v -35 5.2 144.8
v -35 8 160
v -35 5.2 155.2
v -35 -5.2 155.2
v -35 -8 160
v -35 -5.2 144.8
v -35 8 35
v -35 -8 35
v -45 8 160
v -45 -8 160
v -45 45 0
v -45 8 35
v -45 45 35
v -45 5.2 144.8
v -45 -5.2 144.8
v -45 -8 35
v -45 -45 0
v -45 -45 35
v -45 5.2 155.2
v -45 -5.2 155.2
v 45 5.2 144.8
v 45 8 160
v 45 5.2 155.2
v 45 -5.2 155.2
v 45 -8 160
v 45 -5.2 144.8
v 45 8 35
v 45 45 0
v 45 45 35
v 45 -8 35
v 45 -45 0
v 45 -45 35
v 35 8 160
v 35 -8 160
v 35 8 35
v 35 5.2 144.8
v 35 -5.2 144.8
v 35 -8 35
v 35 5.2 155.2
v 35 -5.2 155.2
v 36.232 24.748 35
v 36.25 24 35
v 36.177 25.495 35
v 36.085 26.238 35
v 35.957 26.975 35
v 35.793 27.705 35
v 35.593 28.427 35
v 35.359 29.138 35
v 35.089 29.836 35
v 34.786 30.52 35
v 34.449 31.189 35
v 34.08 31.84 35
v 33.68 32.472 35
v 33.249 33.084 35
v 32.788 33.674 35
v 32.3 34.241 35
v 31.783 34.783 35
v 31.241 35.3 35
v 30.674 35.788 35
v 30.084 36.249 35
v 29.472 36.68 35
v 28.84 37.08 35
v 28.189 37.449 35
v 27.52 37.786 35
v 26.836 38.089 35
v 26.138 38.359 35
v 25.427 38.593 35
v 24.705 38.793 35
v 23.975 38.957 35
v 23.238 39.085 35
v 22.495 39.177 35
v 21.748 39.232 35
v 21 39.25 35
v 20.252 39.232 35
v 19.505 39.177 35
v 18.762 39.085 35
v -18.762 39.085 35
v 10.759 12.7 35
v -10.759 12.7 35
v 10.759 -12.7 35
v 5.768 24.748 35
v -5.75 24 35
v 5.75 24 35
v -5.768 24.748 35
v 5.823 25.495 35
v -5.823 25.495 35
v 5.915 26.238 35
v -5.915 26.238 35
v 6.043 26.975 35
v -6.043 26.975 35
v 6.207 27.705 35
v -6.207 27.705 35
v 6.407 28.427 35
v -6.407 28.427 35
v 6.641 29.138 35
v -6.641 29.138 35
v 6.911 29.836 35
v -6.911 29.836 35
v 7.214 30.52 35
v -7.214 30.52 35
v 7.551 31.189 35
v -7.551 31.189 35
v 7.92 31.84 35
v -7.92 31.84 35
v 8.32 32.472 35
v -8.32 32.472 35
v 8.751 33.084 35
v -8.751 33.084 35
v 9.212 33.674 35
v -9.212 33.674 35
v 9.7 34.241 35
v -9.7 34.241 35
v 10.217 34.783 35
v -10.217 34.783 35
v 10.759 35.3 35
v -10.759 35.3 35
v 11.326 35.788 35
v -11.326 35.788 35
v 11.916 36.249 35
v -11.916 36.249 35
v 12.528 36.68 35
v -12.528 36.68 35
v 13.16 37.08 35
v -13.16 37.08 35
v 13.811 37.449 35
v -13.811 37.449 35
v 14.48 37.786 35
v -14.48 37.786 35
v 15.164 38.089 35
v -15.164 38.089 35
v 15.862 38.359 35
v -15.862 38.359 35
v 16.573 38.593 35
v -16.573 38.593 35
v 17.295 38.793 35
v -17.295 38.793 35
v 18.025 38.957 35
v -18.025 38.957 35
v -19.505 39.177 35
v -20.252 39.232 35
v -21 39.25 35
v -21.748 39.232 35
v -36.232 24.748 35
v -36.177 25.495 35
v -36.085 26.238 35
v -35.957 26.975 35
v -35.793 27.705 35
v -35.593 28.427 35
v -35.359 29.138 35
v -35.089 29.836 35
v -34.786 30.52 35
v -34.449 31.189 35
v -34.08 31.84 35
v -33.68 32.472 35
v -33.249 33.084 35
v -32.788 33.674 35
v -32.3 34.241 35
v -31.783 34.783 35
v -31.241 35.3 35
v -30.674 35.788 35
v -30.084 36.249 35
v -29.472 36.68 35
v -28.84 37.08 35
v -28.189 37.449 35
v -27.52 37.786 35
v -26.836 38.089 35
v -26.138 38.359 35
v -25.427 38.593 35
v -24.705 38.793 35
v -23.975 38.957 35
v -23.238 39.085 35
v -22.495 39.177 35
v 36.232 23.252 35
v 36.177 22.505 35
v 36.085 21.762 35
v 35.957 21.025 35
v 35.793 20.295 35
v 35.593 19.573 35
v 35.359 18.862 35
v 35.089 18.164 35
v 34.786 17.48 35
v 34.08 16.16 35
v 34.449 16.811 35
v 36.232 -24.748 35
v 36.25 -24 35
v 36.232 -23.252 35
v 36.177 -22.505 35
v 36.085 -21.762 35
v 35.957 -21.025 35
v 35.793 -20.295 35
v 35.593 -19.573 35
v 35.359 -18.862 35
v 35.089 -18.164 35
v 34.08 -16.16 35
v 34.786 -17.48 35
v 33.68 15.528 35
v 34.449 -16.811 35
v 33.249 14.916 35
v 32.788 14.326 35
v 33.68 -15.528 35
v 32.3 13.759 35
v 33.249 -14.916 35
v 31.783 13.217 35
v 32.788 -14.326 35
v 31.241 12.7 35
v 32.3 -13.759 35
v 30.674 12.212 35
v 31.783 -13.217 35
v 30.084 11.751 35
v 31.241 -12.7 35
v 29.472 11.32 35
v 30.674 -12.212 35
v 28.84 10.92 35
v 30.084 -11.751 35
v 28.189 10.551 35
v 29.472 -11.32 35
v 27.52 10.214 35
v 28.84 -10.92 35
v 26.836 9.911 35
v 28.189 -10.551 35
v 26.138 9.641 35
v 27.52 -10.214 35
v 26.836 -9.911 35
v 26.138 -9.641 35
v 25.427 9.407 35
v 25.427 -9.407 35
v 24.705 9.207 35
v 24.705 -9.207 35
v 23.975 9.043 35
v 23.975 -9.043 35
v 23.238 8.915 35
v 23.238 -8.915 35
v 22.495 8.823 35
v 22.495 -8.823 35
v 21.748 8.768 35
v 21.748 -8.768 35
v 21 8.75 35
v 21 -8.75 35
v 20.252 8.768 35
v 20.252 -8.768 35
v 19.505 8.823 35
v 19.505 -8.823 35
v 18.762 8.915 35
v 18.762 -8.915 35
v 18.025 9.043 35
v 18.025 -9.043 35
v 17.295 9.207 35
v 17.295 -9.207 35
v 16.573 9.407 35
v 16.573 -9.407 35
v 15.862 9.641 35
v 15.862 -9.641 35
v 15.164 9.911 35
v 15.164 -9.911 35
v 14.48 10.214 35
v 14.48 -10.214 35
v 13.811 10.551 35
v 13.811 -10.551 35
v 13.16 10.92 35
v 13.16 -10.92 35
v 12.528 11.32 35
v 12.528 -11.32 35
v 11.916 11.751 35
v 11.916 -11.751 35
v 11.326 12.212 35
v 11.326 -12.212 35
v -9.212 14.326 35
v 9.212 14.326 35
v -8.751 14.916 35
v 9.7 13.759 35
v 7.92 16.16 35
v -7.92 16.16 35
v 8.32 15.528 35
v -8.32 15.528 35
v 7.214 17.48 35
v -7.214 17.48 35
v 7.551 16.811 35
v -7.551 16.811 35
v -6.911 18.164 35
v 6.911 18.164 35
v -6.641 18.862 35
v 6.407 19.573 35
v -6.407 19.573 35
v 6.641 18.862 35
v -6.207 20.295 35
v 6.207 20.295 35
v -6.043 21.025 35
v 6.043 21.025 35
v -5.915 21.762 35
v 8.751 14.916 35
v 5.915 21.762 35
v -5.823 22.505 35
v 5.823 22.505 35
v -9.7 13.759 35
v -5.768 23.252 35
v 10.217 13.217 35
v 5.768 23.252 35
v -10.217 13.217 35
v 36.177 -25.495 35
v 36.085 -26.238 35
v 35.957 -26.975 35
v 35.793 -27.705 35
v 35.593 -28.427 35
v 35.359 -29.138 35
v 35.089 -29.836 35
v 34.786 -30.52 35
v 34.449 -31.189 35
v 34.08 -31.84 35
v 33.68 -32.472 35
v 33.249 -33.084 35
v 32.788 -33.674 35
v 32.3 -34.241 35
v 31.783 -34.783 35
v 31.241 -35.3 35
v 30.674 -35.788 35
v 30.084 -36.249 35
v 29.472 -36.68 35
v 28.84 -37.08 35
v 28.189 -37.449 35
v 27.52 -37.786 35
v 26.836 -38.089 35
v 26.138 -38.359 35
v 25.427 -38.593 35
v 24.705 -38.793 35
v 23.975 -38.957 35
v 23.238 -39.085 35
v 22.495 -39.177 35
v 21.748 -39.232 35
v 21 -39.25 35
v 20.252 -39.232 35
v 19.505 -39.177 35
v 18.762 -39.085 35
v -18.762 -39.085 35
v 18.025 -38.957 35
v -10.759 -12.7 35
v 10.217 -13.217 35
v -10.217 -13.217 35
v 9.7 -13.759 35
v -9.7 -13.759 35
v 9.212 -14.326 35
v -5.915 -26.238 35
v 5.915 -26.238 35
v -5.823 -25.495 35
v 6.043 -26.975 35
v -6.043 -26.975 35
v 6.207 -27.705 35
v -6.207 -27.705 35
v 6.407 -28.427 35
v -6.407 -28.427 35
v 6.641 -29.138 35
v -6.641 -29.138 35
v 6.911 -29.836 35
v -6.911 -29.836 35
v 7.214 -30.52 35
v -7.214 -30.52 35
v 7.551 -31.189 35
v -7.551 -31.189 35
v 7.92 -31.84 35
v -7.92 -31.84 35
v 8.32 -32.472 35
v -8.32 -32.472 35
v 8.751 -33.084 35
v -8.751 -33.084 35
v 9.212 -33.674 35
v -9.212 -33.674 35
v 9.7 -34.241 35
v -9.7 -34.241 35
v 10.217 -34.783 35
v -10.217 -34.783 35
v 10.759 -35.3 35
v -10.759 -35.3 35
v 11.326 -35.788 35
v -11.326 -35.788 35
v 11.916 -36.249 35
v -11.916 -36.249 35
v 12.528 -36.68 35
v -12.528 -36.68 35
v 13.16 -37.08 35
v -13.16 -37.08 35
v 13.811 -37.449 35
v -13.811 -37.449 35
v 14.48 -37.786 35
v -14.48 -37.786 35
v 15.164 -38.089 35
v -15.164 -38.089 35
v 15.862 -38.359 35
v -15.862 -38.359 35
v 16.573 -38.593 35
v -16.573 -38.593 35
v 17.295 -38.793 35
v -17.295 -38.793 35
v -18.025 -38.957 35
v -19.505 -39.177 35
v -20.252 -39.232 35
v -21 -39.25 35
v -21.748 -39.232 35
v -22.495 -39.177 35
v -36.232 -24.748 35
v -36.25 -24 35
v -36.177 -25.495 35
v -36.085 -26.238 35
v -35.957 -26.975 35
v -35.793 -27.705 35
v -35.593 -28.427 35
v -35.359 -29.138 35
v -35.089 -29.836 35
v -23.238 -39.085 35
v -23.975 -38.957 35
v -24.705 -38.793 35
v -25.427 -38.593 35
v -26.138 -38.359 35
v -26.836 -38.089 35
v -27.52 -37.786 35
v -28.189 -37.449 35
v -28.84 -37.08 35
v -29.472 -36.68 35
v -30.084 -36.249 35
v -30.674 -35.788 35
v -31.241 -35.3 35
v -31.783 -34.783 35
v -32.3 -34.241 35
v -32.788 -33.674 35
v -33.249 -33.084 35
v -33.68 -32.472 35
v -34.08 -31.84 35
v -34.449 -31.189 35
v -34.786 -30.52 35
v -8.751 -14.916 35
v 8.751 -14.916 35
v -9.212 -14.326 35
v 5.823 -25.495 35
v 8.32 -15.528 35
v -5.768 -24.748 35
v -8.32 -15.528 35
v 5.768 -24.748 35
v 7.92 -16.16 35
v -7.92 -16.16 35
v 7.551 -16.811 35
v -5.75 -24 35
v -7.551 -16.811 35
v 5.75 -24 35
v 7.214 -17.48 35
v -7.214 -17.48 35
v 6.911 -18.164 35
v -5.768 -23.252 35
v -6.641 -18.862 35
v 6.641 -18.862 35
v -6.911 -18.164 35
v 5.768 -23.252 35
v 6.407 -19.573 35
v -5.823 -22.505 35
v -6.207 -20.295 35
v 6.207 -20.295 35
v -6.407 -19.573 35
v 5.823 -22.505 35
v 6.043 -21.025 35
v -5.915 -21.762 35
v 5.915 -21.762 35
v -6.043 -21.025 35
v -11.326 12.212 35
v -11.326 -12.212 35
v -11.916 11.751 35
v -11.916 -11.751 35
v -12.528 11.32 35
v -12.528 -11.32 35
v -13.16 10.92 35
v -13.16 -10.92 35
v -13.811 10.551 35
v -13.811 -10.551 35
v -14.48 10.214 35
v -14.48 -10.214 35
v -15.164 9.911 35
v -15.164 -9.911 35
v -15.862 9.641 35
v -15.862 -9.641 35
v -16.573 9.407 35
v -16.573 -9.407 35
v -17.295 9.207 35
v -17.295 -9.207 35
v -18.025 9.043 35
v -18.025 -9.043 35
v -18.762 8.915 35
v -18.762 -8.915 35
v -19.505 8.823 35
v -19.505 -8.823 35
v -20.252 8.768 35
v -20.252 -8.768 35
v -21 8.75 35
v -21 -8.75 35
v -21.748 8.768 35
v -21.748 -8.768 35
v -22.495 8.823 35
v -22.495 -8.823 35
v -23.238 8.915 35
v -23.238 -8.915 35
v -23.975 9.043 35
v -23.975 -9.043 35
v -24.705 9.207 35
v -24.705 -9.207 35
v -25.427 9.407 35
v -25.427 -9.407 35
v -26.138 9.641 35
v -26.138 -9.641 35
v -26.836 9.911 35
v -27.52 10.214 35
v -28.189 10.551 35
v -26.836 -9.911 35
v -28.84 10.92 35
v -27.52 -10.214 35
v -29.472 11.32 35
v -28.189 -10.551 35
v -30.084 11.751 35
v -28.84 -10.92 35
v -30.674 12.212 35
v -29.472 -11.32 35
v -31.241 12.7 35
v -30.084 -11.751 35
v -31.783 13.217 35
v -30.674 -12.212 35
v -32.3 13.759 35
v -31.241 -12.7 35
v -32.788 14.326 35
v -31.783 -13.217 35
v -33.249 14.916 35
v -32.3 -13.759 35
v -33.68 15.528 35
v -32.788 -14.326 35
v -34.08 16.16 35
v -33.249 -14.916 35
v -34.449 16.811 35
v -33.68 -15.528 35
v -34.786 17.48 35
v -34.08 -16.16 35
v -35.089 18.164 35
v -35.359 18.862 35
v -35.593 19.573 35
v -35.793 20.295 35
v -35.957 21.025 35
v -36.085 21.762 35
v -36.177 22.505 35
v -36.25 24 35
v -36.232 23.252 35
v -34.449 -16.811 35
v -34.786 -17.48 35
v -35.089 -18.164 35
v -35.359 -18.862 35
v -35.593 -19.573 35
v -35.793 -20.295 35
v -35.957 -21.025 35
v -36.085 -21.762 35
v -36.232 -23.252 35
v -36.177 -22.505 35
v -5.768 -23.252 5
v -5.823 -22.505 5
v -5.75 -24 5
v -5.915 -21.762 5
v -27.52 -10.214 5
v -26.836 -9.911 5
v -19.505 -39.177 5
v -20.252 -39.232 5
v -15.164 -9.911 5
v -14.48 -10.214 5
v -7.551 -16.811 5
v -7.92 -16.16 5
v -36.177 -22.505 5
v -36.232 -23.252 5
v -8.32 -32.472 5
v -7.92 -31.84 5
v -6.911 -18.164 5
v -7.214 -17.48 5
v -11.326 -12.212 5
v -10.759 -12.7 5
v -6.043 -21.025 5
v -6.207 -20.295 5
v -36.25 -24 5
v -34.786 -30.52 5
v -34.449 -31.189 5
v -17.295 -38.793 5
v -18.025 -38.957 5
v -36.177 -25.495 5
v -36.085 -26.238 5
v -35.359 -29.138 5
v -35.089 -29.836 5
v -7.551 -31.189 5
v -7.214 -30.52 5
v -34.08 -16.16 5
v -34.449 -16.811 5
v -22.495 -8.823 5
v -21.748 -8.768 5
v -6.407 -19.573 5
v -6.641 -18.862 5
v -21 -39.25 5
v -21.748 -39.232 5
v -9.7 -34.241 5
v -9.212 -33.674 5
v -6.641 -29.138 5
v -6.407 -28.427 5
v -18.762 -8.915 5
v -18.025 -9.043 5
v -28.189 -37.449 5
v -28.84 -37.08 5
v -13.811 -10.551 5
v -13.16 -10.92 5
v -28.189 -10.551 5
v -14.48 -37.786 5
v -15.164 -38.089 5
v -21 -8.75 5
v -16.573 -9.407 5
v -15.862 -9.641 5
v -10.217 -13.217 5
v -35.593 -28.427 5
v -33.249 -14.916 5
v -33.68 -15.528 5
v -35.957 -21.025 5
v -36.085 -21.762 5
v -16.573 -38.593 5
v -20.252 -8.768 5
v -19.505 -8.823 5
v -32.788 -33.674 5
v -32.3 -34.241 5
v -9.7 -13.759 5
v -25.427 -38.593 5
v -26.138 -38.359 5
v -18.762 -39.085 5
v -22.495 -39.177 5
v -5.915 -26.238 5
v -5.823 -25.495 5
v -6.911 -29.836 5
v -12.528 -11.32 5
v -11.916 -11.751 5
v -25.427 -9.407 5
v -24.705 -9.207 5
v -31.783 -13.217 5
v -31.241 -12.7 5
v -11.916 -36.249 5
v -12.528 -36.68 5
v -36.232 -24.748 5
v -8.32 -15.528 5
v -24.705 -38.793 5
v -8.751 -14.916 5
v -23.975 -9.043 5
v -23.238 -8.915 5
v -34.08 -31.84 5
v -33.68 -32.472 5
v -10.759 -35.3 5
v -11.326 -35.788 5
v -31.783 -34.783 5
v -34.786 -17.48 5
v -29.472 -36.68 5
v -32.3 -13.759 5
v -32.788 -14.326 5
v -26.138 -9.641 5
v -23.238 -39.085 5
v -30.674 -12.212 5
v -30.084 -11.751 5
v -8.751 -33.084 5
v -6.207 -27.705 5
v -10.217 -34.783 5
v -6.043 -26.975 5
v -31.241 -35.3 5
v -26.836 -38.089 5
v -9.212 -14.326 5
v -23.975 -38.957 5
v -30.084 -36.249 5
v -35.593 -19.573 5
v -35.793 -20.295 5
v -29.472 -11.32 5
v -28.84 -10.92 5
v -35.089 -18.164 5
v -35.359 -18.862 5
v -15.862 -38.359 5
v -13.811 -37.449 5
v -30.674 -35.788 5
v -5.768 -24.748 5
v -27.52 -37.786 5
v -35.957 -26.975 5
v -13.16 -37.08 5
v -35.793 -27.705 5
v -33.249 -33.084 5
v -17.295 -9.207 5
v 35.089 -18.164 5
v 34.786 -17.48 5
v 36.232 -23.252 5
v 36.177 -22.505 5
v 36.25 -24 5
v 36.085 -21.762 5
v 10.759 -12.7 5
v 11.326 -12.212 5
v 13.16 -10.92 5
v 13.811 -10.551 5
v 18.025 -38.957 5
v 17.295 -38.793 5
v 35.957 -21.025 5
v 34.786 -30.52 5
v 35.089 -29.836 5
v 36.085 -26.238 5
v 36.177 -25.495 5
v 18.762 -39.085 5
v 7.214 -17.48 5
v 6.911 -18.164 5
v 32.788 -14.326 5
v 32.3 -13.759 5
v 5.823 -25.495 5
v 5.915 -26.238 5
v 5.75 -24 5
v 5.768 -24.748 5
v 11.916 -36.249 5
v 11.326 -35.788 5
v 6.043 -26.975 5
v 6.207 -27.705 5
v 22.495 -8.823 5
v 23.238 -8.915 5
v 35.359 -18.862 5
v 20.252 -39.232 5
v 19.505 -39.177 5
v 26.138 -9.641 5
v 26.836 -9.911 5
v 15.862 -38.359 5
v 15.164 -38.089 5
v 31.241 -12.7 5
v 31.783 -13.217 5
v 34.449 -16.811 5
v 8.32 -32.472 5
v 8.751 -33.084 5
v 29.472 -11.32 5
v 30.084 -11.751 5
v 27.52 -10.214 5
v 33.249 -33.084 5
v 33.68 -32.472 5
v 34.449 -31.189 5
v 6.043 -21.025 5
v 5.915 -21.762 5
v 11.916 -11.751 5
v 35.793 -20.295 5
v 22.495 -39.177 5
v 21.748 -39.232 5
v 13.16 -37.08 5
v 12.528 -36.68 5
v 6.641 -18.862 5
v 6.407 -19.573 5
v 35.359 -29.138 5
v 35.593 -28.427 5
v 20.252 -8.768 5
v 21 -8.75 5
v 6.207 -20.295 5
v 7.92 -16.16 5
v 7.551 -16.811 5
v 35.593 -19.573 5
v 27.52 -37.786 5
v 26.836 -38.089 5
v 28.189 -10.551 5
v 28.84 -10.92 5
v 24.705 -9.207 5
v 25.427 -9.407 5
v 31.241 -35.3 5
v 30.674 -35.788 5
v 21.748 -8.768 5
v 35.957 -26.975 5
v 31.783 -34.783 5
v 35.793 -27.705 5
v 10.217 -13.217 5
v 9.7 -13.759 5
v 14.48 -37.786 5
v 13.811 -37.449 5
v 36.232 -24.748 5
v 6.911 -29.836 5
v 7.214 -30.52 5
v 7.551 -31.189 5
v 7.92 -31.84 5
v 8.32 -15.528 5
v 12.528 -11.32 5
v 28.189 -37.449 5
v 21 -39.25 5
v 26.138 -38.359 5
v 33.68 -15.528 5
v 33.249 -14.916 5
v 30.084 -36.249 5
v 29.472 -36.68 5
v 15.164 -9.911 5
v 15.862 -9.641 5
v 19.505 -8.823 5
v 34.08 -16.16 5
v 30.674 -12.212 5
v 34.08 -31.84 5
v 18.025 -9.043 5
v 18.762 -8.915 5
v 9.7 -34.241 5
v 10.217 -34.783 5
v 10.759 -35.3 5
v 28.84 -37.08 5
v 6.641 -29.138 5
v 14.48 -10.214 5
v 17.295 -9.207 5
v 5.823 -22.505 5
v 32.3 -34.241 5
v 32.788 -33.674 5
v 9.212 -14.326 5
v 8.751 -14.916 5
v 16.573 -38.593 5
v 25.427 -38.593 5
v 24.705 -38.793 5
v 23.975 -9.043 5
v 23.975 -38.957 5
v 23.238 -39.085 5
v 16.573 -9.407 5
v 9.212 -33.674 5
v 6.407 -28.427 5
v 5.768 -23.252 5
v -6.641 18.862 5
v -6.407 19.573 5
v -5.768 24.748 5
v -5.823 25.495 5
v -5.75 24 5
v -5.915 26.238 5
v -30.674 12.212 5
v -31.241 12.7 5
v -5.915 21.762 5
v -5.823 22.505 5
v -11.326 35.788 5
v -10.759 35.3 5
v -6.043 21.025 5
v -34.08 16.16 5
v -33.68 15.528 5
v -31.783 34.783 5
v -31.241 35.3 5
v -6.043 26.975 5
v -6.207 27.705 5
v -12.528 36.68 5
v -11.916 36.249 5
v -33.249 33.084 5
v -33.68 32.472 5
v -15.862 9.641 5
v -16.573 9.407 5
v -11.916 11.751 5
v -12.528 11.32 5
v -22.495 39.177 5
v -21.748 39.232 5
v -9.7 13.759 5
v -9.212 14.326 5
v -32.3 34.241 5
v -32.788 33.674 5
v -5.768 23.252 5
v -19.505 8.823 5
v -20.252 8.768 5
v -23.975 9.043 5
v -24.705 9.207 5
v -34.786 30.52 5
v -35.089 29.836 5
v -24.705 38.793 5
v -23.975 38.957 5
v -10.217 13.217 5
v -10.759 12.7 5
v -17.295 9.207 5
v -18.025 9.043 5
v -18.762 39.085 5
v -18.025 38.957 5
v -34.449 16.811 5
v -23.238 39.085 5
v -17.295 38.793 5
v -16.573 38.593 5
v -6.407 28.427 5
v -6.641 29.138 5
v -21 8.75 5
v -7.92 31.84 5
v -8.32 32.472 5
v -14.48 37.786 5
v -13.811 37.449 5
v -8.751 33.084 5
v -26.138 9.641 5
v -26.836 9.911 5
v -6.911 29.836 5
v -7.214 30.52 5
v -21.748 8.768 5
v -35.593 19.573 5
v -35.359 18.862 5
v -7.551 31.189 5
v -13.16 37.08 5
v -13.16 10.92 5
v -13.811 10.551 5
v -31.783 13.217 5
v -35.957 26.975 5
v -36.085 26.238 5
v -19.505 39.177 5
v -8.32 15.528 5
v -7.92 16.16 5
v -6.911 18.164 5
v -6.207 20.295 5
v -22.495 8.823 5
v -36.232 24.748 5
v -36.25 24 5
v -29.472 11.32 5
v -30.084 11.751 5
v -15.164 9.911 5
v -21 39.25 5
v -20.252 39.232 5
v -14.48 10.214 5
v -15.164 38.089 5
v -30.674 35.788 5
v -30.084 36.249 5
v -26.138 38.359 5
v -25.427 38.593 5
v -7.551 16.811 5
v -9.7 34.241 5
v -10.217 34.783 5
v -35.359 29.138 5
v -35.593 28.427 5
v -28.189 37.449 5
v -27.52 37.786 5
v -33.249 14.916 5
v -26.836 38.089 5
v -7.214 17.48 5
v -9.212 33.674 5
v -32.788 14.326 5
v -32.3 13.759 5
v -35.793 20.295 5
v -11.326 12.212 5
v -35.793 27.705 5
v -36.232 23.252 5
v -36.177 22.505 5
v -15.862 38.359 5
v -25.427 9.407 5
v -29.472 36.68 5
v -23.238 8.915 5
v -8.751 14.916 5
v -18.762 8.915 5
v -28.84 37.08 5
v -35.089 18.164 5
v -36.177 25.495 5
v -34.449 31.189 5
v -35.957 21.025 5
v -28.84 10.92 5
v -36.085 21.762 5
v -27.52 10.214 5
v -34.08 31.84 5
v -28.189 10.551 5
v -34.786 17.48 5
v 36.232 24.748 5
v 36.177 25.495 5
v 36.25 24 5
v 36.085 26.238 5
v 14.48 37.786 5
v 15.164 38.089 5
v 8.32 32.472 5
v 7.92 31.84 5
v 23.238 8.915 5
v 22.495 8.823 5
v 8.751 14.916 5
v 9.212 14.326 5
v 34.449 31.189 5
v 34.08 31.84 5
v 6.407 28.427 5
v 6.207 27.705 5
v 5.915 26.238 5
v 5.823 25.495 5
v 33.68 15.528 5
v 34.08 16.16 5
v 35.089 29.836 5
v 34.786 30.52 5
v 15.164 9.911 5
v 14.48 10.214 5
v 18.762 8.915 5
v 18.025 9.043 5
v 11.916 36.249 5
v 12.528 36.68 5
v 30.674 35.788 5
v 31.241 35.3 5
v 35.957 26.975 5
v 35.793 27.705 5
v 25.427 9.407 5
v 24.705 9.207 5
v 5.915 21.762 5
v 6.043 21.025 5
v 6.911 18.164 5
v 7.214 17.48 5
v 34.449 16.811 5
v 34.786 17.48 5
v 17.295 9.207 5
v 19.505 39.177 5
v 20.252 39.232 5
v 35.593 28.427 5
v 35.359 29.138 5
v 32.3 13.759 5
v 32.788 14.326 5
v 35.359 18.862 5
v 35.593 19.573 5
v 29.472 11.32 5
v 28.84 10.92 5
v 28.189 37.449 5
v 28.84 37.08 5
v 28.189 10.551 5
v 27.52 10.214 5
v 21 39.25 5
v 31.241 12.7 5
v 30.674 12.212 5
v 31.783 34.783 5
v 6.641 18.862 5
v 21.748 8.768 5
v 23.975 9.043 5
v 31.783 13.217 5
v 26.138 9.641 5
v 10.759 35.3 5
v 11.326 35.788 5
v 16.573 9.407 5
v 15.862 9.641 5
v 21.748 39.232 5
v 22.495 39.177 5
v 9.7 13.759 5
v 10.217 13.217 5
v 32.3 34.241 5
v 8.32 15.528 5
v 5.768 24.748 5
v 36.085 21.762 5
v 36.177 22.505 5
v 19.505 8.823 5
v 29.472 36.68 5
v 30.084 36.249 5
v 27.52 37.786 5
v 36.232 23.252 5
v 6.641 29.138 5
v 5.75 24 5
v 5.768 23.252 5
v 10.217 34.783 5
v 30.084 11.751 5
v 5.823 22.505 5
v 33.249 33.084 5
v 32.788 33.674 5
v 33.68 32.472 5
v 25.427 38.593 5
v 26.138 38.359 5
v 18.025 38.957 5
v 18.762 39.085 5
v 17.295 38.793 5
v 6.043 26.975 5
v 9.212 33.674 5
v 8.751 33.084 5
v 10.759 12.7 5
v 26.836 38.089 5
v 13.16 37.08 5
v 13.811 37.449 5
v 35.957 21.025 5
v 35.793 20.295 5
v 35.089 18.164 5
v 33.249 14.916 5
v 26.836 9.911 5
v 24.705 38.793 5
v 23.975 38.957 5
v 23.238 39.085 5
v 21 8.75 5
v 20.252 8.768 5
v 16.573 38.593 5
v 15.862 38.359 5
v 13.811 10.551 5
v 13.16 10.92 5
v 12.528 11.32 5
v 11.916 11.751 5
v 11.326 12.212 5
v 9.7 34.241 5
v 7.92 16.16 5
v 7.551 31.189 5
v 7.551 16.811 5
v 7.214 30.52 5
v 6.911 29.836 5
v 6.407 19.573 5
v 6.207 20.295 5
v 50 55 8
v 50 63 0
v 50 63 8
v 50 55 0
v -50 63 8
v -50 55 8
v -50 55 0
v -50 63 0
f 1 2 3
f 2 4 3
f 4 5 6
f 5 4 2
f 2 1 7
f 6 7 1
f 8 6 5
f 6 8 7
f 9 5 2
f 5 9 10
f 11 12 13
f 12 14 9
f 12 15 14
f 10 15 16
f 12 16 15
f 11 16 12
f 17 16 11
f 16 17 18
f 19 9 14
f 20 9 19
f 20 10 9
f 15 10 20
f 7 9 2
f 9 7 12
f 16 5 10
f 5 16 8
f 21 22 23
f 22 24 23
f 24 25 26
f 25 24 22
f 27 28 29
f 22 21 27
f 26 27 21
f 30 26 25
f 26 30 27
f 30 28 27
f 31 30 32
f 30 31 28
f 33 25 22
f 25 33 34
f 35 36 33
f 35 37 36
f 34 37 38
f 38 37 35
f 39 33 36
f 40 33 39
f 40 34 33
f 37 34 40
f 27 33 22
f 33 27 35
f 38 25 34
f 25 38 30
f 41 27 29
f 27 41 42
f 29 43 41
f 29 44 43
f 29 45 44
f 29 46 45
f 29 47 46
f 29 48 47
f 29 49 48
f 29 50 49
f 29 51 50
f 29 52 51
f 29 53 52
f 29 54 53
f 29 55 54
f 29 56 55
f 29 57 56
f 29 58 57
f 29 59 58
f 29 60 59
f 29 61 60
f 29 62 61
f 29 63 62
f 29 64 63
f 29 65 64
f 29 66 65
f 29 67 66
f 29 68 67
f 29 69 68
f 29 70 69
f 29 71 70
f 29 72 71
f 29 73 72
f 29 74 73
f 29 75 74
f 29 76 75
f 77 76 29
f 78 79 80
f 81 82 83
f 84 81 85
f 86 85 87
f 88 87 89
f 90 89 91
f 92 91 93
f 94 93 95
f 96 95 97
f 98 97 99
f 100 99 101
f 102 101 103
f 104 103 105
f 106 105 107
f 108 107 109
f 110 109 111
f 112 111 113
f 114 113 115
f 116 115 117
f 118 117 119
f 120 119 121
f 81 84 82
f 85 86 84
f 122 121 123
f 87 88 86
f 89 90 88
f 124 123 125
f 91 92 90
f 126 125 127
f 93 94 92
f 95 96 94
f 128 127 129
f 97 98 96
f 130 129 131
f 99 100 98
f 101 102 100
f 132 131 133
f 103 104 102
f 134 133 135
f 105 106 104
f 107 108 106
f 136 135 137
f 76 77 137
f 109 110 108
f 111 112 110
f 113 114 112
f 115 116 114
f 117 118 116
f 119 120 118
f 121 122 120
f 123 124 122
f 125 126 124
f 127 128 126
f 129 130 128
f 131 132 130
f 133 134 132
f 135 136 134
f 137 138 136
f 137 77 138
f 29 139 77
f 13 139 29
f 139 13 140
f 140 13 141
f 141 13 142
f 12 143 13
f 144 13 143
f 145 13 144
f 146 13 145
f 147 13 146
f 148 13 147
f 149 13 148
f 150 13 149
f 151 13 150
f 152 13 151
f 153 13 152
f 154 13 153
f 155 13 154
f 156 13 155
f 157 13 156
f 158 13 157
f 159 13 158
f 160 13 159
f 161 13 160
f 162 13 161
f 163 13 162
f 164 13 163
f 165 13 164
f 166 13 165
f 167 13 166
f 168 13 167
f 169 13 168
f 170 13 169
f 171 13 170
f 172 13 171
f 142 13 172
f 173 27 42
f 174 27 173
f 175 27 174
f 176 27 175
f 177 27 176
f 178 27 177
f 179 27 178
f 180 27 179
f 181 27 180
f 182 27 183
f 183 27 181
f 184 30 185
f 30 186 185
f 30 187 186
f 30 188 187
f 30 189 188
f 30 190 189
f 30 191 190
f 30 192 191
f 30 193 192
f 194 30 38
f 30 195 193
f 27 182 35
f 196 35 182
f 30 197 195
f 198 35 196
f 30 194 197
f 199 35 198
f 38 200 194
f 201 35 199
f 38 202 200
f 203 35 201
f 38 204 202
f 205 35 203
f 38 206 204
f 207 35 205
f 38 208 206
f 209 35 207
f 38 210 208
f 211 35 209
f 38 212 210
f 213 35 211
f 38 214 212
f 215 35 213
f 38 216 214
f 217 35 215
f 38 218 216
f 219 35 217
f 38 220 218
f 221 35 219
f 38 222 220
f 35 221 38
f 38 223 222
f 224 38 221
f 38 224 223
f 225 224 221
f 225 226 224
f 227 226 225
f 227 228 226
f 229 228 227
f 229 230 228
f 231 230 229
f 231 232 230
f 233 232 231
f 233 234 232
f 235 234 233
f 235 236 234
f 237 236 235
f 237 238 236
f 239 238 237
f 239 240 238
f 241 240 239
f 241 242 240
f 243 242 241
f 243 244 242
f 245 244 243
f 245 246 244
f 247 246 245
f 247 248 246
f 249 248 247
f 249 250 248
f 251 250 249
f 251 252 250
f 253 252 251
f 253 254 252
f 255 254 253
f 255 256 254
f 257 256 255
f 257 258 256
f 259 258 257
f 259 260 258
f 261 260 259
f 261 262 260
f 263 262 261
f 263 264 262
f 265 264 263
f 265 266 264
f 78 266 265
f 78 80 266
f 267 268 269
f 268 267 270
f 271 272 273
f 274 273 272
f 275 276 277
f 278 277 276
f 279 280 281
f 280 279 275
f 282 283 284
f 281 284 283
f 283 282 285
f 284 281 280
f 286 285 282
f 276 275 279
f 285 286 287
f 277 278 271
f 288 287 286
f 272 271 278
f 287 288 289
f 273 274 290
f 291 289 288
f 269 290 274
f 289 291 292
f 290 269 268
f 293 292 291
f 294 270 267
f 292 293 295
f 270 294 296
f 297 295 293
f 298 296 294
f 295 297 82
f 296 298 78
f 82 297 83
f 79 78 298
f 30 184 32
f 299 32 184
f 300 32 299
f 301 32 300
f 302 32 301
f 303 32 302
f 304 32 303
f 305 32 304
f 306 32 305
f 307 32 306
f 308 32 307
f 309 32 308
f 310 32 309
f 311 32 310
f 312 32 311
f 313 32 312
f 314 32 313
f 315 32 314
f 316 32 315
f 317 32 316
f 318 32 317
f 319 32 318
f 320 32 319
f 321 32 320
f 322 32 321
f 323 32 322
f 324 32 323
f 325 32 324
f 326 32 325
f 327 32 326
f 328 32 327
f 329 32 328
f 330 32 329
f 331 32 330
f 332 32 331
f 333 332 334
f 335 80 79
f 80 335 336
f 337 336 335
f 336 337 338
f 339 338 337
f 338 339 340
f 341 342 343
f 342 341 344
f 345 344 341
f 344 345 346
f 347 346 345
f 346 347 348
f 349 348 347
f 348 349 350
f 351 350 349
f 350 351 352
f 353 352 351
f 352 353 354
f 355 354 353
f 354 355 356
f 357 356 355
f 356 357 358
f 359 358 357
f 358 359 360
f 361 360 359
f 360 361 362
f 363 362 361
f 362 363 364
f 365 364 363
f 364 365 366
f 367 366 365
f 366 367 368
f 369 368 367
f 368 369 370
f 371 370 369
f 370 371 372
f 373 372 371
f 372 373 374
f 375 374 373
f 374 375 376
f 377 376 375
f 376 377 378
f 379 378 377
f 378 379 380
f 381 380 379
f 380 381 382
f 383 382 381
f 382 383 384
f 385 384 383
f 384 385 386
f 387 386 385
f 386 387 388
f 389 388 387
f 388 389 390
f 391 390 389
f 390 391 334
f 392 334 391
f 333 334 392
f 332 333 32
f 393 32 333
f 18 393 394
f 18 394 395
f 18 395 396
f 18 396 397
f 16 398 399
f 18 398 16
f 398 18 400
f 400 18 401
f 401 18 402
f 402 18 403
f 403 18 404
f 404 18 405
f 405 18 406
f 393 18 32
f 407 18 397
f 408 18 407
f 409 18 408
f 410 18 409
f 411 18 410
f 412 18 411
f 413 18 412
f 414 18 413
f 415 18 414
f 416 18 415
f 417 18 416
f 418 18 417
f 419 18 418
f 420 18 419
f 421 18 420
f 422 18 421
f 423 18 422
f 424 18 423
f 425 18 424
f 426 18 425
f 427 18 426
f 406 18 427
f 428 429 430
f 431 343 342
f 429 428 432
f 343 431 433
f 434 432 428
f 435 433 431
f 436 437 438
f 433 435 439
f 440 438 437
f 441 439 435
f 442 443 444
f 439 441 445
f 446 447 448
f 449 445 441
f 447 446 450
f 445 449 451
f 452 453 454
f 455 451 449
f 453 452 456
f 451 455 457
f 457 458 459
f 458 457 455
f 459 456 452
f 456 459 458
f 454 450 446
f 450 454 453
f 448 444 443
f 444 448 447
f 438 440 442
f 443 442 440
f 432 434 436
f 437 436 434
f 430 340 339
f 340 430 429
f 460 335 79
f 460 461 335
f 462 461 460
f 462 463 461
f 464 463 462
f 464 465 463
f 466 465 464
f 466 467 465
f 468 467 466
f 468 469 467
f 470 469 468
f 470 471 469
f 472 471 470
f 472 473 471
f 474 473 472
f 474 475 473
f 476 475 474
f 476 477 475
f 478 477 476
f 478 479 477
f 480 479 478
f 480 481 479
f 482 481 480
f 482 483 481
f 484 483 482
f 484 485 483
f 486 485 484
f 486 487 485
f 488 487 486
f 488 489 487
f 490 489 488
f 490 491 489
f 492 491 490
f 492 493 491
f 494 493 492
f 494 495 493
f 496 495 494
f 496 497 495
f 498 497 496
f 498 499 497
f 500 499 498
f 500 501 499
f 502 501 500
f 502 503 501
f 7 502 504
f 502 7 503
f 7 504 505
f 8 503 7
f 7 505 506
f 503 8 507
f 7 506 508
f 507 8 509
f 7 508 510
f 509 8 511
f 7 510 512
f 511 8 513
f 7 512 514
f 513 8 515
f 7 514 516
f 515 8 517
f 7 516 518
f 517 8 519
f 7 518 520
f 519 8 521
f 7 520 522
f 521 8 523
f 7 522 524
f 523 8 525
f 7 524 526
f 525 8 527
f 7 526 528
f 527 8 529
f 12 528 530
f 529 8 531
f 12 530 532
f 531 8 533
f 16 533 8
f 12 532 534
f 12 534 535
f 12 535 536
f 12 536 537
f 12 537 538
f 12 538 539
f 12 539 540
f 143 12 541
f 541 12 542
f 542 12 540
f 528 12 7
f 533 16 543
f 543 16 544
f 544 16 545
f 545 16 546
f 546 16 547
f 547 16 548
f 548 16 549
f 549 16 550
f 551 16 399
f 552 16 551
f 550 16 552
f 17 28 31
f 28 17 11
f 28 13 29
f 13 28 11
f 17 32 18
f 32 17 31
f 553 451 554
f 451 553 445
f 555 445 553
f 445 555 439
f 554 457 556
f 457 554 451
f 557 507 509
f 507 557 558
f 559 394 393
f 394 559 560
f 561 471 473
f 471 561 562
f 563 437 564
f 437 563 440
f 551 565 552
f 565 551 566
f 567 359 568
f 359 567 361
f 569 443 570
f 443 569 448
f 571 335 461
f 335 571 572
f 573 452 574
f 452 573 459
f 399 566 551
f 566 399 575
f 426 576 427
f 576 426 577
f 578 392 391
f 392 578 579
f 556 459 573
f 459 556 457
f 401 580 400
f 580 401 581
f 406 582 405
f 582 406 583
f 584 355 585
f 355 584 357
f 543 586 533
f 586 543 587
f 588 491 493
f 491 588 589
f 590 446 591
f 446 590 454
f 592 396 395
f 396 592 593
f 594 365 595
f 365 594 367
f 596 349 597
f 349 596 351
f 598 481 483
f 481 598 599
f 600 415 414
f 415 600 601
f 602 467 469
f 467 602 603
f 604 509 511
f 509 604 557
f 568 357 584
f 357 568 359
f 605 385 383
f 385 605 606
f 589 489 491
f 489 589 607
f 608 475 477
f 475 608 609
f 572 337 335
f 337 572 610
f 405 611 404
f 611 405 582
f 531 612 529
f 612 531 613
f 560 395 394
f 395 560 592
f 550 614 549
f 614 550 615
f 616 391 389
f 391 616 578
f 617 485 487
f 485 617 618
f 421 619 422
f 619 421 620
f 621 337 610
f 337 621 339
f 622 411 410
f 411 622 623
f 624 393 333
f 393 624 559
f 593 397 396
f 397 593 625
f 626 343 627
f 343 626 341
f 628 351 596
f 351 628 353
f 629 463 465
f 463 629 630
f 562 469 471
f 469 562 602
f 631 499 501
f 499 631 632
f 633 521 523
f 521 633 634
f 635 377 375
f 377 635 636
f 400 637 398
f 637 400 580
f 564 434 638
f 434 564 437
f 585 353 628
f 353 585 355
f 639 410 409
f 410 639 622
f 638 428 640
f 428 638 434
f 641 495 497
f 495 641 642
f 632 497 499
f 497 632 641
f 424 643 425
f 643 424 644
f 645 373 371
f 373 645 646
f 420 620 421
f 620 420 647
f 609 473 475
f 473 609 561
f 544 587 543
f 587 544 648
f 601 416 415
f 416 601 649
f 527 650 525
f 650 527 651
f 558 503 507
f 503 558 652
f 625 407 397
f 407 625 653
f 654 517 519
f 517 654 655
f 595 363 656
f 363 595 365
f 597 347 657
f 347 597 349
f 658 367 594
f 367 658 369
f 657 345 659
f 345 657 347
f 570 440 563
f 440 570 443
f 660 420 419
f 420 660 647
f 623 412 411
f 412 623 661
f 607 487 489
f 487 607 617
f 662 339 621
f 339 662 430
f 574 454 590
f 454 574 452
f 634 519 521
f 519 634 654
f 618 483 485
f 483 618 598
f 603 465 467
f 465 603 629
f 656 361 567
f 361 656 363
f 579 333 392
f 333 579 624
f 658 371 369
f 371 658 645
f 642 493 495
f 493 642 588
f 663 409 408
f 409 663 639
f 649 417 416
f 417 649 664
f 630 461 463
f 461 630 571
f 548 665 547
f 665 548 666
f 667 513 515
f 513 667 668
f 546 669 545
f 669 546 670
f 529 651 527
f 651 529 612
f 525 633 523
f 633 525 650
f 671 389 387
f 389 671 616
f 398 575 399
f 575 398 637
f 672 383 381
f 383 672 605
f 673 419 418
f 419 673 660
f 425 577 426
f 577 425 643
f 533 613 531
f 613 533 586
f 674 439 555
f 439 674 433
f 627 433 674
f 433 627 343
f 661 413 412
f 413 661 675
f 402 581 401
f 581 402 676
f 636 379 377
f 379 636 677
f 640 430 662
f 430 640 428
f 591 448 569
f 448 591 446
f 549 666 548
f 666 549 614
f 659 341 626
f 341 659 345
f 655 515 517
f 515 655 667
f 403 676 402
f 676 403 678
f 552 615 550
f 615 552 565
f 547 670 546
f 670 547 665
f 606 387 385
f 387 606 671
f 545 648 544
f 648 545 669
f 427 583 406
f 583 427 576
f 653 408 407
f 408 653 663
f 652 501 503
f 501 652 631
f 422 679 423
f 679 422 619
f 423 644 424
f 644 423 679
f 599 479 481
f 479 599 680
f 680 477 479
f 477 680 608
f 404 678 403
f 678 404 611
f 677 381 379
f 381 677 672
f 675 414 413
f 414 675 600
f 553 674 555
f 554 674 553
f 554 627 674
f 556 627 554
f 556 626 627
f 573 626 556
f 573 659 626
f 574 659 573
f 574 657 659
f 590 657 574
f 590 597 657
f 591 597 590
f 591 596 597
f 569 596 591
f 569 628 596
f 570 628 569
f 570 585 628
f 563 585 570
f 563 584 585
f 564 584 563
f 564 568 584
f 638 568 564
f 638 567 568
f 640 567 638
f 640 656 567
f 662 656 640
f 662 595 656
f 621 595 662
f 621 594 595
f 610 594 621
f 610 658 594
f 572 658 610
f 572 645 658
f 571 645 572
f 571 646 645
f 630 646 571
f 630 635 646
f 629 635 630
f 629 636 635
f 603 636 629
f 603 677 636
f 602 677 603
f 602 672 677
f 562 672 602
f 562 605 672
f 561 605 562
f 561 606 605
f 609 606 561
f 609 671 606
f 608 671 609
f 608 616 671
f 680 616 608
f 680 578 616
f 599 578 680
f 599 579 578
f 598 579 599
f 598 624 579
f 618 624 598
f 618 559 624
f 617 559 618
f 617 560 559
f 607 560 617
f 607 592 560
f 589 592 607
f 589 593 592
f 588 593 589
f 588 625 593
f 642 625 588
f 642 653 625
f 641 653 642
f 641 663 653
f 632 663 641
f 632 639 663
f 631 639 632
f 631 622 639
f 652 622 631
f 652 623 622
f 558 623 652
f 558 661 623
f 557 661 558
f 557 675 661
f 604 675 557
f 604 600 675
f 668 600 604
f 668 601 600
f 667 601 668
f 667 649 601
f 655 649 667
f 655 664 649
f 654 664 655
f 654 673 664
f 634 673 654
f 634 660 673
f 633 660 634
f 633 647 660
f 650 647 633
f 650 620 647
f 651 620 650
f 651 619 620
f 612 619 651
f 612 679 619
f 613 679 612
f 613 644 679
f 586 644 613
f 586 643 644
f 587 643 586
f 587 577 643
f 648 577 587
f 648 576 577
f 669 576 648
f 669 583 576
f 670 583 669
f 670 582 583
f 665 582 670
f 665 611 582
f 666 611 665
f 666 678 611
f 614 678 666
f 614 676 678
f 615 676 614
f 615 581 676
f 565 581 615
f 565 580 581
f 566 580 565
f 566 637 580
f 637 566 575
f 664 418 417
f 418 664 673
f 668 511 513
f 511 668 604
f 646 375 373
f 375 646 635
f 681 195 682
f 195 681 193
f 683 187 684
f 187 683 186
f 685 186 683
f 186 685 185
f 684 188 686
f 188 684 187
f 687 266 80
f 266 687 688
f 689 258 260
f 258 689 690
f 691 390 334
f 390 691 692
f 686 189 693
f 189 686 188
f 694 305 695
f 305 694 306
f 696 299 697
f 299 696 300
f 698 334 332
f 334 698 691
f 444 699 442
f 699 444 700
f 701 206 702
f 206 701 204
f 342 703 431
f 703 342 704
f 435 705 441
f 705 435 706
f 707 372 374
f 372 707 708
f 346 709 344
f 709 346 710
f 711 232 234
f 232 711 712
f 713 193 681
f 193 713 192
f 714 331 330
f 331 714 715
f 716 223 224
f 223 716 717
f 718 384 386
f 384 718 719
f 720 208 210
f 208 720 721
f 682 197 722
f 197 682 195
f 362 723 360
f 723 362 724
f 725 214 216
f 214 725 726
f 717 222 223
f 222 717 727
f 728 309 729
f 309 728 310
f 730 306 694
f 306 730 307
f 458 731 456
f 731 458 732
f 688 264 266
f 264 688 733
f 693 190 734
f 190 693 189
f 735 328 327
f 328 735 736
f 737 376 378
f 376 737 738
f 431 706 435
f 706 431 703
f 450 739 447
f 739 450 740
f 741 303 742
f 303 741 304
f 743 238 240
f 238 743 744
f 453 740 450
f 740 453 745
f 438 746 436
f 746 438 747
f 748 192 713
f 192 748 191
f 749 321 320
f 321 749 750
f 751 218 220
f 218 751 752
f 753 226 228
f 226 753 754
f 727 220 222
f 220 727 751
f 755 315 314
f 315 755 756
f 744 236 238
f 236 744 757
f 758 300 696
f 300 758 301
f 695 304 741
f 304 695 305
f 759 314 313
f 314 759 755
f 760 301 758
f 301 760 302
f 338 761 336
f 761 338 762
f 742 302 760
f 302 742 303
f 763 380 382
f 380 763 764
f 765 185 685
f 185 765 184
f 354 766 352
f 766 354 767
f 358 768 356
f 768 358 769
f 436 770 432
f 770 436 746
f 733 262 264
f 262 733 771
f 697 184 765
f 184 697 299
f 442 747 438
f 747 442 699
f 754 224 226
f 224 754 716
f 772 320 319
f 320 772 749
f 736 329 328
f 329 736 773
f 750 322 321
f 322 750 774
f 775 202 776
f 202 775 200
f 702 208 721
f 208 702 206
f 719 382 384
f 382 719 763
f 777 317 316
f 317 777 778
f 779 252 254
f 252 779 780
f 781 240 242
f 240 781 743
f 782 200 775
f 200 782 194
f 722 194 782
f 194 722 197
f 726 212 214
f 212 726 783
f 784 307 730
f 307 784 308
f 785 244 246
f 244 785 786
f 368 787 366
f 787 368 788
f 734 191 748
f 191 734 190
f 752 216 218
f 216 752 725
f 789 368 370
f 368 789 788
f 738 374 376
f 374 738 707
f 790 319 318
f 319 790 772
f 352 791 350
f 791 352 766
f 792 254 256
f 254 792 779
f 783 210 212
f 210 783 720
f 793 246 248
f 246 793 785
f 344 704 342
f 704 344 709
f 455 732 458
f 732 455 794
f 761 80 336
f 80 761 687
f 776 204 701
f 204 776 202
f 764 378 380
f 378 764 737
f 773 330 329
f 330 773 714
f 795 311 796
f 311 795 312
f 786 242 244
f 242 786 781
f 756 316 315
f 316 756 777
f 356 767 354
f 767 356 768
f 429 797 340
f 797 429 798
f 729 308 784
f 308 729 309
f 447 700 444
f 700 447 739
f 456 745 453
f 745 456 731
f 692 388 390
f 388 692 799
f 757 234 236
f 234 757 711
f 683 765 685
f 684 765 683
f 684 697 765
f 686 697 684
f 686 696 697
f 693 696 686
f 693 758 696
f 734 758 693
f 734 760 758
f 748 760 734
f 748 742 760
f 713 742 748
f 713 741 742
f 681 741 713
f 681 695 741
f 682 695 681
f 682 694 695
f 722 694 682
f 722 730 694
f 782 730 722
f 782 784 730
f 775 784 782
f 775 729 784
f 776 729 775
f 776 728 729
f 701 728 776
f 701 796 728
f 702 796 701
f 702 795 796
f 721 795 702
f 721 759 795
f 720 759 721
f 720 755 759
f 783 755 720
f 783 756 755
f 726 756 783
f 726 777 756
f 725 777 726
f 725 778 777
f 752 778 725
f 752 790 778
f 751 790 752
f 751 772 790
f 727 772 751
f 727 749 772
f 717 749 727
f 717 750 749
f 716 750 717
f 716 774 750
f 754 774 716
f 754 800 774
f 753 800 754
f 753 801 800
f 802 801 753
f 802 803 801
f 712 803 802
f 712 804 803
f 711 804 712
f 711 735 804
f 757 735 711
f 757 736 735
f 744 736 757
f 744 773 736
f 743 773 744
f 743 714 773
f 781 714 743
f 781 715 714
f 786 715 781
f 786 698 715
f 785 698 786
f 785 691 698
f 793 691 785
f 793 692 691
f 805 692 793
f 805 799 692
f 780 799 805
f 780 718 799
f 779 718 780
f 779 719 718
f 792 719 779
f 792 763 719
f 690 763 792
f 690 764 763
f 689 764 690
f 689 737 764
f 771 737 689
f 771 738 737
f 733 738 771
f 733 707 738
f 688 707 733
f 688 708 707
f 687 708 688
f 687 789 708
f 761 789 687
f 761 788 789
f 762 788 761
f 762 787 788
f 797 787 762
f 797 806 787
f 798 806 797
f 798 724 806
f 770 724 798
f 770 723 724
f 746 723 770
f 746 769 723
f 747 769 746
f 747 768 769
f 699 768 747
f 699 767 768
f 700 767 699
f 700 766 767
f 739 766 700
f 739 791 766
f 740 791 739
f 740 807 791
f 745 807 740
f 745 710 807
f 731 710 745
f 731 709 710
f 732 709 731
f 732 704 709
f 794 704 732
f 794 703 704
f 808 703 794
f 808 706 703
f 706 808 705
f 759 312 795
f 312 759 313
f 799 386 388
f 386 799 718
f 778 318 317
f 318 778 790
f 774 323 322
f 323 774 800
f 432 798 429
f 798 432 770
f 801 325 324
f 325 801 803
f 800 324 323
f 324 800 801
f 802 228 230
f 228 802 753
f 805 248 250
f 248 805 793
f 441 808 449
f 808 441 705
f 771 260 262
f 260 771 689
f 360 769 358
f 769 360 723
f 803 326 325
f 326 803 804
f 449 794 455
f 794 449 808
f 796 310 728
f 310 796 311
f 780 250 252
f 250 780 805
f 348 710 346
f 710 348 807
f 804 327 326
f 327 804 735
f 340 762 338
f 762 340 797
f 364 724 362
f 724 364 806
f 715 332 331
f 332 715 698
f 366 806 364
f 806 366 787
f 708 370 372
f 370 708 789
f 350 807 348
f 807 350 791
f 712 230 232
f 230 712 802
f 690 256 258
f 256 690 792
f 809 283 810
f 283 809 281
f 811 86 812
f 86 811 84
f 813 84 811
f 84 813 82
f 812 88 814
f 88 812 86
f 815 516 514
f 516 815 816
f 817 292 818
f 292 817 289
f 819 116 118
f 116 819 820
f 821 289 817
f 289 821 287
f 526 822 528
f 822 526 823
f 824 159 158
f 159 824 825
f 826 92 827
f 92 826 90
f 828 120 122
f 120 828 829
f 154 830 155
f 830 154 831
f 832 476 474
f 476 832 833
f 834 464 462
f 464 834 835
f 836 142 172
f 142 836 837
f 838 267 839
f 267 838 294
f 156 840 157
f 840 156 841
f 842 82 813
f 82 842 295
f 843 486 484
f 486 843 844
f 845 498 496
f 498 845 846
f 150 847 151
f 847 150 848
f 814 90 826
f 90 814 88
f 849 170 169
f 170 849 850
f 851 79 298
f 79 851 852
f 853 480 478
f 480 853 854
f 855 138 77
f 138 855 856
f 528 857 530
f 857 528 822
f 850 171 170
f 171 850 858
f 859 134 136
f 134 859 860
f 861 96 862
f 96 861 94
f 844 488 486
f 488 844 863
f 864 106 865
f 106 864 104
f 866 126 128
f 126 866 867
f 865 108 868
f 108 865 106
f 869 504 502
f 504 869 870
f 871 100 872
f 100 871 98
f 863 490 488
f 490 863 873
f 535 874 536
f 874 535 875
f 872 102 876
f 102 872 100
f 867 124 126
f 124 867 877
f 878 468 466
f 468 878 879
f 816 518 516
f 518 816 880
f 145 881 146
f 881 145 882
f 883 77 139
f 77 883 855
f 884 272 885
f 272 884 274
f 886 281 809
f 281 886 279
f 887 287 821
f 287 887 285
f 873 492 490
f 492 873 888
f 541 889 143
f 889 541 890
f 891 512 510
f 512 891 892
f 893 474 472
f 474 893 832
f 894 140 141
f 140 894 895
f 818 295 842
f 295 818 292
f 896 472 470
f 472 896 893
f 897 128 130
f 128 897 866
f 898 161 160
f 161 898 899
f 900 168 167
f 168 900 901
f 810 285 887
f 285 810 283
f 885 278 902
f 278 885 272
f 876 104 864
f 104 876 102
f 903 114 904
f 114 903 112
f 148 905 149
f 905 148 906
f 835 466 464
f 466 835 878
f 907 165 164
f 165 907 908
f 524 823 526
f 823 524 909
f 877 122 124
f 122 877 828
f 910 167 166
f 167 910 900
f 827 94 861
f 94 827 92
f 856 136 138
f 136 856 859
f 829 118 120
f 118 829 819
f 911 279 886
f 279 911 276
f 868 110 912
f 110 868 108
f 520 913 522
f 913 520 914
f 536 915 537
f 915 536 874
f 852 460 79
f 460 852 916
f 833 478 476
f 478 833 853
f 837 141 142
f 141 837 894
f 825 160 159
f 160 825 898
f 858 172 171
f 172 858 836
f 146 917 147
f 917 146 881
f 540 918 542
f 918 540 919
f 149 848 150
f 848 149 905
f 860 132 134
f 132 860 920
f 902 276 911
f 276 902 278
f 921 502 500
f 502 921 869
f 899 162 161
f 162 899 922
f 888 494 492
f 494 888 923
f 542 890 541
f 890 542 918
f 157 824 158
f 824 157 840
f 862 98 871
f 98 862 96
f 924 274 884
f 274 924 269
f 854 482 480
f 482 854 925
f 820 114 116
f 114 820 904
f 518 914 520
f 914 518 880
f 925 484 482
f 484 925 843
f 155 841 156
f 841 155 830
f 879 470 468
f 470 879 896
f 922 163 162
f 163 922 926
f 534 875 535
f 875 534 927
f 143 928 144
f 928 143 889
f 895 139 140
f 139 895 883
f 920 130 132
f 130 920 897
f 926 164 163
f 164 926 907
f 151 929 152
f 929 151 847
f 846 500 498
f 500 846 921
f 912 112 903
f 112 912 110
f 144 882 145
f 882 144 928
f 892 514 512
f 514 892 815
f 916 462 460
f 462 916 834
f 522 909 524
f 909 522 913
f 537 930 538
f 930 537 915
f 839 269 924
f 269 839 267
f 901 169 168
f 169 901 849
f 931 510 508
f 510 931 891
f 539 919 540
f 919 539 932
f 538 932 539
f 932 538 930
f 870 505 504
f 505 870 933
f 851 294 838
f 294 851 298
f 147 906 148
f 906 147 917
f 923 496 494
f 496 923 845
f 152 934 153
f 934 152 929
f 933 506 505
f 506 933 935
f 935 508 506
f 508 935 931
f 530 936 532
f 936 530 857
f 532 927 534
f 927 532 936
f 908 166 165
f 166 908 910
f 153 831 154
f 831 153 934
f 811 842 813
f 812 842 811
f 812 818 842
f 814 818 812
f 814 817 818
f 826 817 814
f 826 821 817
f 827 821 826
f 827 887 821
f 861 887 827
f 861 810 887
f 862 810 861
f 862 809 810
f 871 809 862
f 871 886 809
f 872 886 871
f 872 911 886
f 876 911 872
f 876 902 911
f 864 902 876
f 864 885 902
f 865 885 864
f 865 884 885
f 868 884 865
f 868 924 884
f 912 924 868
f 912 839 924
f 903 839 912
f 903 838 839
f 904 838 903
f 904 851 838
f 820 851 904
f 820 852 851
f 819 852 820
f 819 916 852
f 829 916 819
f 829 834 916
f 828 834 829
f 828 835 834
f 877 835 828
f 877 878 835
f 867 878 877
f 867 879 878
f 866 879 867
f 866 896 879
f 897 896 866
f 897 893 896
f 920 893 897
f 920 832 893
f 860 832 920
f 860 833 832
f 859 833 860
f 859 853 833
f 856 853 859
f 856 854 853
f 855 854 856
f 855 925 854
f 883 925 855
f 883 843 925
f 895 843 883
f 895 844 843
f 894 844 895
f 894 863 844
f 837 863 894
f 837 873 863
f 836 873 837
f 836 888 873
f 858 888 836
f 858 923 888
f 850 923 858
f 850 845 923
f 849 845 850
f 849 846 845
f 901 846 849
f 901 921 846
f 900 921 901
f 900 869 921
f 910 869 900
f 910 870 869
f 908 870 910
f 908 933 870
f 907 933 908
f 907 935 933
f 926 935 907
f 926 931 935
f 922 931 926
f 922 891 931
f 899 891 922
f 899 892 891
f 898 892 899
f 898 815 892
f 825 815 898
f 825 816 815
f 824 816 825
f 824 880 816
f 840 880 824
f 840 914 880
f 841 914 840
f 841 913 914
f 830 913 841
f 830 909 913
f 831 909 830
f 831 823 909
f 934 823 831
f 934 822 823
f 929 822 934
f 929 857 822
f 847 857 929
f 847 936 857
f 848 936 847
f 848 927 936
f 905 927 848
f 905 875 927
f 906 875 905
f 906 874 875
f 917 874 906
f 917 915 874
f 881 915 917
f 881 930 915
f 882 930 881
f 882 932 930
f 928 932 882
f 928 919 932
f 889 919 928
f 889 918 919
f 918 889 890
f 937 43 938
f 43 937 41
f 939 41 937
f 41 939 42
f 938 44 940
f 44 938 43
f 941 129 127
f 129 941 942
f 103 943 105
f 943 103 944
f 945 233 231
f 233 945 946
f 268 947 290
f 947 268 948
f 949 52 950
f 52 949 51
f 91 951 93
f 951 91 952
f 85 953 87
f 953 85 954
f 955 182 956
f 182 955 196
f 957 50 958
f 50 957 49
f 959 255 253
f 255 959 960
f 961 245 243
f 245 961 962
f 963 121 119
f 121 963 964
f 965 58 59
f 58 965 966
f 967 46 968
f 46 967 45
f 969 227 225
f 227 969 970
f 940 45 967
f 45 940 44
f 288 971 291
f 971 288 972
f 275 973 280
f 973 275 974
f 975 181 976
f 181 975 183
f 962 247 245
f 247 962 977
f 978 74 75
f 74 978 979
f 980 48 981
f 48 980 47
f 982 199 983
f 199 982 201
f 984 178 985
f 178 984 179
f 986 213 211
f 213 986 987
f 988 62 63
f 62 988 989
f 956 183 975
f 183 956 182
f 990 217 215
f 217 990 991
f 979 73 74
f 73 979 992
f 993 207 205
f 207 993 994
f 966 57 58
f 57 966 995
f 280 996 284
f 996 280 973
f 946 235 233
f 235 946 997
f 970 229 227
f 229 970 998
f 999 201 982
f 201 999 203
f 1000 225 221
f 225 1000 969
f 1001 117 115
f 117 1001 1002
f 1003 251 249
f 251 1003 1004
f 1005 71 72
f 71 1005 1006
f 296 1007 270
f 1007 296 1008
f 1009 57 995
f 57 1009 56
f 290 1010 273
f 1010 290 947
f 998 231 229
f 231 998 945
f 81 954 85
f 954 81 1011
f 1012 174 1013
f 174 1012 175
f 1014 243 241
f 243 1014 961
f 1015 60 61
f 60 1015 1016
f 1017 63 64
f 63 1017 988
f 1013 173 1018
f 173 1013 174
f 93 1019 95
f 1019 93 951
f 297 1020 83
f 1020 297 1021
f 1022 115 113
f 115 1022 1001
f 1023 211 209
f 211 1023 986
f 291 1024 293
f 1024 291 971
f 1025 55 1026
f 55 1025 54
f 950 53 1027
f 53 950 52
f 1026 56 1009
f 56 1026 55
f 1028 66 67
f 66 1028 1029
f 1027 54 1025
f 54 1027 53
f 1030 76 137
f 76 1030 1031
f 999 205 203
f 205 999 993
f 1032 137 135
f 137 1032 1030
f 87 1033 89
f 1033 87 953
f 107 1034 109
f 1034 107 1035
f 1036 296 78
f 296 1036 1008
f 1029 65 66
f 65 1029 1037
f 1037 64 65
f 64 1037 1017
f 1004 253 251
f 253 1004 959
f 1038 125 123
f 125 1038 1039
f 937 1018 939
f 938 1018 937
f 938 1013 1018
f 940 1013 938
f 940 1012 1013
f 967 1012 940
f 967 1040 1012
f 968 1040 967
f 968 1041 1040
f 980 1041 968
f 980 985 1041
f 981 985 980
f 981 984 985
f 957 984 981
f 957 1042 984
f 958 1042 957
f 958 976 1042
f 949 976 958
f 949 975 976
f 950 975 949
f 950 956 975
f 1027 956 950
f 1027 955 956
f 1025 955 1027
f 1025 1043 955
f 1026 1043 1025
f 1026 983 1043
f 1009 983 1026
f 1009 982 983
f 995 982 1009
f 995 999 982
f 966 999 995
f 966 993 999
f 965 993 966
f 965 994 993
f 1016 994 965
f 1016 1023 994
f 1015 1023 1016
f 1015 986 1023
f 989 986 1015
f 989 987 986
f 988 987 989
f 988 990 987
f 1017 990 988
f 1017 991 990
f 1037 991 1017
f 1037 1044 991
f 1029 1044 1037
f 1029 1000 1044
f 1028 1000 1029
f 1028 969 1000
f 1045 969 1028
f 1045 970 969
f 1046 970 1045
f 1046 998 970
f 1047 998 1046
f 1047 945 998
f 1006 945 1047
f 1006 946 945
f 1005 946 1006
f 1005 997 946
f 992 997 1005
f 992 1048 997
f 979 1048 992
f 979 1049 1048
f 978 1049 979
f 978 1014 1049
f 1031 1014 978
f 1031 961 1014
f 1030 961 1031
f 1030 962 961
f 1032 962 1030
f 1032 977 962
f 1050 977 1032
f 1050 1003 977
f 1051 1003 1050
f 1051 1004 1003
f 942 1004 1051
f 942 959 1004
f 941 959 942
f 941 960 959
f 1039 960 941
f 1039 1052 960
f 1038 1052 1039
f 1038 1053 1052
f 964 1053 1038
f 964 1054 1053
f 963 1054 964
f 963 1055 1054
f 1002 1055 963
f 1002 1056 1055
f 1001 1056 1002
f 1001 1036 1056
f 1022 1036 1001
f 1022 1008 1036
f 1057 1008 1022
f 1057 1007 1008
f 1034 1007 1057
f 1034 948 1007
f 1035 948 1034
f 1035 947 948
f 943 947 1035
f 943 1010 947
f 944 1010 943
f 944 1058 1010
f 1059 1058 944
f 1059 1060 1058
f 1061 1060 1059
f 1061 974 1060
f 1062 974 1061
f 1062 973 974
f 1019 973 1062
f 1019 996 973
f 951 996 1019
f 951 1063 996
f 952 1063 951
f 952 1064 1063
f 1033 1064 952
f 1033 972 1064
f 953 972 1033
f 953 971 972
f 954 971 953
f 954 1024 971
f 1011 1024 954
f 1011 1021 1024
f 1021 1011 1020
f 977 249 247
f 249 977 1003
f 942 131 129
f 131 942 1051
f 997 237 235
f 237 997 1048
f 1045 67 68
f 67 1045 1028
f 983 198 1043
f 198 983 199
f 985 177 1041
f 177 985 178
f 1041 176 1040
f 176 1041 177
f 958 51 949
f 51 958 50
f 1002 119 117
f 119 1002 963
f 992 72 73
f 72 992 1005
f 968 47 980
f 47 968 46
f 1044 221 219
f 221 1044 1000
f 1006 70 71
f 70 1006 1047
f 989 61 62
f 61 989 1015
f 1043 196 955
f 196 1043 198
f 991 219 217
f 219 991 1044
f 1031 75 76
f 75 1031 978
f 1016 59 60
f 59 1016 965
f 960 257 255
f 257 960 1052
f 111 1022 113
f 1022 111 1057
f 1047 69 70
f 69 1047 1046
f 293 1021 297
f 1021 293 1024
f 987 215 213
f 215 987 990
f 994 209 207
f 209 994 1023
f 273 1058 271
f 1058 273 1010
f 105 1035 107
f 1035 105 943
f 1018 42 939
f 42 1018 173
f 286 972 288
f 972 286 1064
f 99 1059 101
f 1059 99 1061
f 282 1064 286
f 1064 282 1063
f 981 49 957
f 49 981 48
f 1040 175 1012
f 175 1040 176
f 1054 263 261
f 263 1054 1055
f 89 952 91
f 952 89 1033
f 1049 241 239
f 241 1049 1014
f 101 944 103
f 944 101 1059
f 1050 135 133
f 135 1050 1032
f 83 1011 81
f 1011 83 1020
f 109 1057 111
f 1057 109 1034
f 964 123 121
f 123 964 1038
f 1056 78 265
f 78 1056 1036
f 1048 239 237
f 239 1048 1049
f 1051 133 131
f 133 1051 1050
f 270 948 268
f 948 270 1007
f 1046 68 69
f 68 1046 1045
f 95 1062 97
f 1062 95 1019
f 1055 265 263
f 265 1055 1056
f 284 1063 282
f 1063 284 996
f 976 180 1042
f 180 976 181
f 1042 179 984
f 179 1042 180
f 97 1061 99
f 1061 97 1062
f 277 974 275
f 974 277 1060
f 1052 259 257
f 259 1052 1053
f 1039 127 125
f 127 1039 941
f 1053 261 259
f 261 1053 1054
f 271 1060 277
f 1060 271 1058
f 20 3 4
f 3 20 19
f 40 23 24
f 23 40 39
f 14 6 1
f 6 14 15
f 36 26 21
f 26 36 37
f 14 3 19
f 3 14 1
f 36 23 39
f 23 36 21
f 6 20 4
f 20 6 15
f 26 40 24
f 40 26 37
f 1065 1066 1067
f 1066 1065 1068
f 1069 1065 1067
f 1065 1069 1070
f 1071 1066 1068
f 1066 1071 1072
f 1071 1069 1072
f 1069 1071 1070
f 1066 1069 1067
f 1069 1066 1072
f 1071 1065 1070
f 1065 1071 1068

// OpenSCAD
// KNOWN-WRONG PART (must fail): the handle bar is 8 x 8 mm instead of 10 x 10
// Carrier for four 50 mL conical tubes with a carrying handle; two parts printed side by side
// Category: hardware. Part 1: a base block with four blind seats and two posts with square holes
// near the top. Part 2: a square handle bar, printed lying flat, pushed through both posts.
// Print: PETG, 0.2 mm layers, 4 perimeters; the posts are tall, so print slowly near the top.
// A drop of glue (or a tight fit) keeps the bar in place.
// SPDX-License-Identifier: CERN-OHL-P-2.0

/* [Carrier] */
base = [90, 90, 35];      // X, Y, Z [mm], centred on the origin
seat_d = 30.5;            // 50 mL conical tube is ~29-30 mm across
seat_depth = 30;          // 5 mm floor
seat_pos = [[-21, -24], [21, -24], [-21, 24], [21, 24]];
post = [10, 16];          // post X, Y; flush with the X end faces, centred on y = 0
post_top = 160;
hole = 10.4;              // square hole along X for the handle bar
hole_z = 150;
bar = [100, 8, 8];        // handle bar X, Y, Z
bar_gap = 10;             // gap between the bar and the base's +Y face

/* [Hidden] */
eps = 0.01;

// part 1: carrier
difference() {
    union() {
        translate([-base.x / 2, -base.y / 2, 0]) cube(base);
        for (s = [-1, 1])
            translate([s > 0 ? base.x / 2 - post.x : -base.x / 2, -post.y / 2, base.z - eps])
                cube([post.x, post.y, post_top - base.z + eps]);
    }
    for (p = seat_pos)
        translate([p.x, p.y, base.z - seat_depth]) cylinder(d = seat_d, h = seat_depth + 1, $fn = 128);
    translate([-base.x / 2 - 1, -hole / 2, hole_z - hole / 2]) cube([base.x + 2, hole, hole]);
}
// part 2: handle bar, beside the base on the +Y side
translate([-bar.x / 2, base.y / 2 + bar_gap, 0]) cube(bar);
